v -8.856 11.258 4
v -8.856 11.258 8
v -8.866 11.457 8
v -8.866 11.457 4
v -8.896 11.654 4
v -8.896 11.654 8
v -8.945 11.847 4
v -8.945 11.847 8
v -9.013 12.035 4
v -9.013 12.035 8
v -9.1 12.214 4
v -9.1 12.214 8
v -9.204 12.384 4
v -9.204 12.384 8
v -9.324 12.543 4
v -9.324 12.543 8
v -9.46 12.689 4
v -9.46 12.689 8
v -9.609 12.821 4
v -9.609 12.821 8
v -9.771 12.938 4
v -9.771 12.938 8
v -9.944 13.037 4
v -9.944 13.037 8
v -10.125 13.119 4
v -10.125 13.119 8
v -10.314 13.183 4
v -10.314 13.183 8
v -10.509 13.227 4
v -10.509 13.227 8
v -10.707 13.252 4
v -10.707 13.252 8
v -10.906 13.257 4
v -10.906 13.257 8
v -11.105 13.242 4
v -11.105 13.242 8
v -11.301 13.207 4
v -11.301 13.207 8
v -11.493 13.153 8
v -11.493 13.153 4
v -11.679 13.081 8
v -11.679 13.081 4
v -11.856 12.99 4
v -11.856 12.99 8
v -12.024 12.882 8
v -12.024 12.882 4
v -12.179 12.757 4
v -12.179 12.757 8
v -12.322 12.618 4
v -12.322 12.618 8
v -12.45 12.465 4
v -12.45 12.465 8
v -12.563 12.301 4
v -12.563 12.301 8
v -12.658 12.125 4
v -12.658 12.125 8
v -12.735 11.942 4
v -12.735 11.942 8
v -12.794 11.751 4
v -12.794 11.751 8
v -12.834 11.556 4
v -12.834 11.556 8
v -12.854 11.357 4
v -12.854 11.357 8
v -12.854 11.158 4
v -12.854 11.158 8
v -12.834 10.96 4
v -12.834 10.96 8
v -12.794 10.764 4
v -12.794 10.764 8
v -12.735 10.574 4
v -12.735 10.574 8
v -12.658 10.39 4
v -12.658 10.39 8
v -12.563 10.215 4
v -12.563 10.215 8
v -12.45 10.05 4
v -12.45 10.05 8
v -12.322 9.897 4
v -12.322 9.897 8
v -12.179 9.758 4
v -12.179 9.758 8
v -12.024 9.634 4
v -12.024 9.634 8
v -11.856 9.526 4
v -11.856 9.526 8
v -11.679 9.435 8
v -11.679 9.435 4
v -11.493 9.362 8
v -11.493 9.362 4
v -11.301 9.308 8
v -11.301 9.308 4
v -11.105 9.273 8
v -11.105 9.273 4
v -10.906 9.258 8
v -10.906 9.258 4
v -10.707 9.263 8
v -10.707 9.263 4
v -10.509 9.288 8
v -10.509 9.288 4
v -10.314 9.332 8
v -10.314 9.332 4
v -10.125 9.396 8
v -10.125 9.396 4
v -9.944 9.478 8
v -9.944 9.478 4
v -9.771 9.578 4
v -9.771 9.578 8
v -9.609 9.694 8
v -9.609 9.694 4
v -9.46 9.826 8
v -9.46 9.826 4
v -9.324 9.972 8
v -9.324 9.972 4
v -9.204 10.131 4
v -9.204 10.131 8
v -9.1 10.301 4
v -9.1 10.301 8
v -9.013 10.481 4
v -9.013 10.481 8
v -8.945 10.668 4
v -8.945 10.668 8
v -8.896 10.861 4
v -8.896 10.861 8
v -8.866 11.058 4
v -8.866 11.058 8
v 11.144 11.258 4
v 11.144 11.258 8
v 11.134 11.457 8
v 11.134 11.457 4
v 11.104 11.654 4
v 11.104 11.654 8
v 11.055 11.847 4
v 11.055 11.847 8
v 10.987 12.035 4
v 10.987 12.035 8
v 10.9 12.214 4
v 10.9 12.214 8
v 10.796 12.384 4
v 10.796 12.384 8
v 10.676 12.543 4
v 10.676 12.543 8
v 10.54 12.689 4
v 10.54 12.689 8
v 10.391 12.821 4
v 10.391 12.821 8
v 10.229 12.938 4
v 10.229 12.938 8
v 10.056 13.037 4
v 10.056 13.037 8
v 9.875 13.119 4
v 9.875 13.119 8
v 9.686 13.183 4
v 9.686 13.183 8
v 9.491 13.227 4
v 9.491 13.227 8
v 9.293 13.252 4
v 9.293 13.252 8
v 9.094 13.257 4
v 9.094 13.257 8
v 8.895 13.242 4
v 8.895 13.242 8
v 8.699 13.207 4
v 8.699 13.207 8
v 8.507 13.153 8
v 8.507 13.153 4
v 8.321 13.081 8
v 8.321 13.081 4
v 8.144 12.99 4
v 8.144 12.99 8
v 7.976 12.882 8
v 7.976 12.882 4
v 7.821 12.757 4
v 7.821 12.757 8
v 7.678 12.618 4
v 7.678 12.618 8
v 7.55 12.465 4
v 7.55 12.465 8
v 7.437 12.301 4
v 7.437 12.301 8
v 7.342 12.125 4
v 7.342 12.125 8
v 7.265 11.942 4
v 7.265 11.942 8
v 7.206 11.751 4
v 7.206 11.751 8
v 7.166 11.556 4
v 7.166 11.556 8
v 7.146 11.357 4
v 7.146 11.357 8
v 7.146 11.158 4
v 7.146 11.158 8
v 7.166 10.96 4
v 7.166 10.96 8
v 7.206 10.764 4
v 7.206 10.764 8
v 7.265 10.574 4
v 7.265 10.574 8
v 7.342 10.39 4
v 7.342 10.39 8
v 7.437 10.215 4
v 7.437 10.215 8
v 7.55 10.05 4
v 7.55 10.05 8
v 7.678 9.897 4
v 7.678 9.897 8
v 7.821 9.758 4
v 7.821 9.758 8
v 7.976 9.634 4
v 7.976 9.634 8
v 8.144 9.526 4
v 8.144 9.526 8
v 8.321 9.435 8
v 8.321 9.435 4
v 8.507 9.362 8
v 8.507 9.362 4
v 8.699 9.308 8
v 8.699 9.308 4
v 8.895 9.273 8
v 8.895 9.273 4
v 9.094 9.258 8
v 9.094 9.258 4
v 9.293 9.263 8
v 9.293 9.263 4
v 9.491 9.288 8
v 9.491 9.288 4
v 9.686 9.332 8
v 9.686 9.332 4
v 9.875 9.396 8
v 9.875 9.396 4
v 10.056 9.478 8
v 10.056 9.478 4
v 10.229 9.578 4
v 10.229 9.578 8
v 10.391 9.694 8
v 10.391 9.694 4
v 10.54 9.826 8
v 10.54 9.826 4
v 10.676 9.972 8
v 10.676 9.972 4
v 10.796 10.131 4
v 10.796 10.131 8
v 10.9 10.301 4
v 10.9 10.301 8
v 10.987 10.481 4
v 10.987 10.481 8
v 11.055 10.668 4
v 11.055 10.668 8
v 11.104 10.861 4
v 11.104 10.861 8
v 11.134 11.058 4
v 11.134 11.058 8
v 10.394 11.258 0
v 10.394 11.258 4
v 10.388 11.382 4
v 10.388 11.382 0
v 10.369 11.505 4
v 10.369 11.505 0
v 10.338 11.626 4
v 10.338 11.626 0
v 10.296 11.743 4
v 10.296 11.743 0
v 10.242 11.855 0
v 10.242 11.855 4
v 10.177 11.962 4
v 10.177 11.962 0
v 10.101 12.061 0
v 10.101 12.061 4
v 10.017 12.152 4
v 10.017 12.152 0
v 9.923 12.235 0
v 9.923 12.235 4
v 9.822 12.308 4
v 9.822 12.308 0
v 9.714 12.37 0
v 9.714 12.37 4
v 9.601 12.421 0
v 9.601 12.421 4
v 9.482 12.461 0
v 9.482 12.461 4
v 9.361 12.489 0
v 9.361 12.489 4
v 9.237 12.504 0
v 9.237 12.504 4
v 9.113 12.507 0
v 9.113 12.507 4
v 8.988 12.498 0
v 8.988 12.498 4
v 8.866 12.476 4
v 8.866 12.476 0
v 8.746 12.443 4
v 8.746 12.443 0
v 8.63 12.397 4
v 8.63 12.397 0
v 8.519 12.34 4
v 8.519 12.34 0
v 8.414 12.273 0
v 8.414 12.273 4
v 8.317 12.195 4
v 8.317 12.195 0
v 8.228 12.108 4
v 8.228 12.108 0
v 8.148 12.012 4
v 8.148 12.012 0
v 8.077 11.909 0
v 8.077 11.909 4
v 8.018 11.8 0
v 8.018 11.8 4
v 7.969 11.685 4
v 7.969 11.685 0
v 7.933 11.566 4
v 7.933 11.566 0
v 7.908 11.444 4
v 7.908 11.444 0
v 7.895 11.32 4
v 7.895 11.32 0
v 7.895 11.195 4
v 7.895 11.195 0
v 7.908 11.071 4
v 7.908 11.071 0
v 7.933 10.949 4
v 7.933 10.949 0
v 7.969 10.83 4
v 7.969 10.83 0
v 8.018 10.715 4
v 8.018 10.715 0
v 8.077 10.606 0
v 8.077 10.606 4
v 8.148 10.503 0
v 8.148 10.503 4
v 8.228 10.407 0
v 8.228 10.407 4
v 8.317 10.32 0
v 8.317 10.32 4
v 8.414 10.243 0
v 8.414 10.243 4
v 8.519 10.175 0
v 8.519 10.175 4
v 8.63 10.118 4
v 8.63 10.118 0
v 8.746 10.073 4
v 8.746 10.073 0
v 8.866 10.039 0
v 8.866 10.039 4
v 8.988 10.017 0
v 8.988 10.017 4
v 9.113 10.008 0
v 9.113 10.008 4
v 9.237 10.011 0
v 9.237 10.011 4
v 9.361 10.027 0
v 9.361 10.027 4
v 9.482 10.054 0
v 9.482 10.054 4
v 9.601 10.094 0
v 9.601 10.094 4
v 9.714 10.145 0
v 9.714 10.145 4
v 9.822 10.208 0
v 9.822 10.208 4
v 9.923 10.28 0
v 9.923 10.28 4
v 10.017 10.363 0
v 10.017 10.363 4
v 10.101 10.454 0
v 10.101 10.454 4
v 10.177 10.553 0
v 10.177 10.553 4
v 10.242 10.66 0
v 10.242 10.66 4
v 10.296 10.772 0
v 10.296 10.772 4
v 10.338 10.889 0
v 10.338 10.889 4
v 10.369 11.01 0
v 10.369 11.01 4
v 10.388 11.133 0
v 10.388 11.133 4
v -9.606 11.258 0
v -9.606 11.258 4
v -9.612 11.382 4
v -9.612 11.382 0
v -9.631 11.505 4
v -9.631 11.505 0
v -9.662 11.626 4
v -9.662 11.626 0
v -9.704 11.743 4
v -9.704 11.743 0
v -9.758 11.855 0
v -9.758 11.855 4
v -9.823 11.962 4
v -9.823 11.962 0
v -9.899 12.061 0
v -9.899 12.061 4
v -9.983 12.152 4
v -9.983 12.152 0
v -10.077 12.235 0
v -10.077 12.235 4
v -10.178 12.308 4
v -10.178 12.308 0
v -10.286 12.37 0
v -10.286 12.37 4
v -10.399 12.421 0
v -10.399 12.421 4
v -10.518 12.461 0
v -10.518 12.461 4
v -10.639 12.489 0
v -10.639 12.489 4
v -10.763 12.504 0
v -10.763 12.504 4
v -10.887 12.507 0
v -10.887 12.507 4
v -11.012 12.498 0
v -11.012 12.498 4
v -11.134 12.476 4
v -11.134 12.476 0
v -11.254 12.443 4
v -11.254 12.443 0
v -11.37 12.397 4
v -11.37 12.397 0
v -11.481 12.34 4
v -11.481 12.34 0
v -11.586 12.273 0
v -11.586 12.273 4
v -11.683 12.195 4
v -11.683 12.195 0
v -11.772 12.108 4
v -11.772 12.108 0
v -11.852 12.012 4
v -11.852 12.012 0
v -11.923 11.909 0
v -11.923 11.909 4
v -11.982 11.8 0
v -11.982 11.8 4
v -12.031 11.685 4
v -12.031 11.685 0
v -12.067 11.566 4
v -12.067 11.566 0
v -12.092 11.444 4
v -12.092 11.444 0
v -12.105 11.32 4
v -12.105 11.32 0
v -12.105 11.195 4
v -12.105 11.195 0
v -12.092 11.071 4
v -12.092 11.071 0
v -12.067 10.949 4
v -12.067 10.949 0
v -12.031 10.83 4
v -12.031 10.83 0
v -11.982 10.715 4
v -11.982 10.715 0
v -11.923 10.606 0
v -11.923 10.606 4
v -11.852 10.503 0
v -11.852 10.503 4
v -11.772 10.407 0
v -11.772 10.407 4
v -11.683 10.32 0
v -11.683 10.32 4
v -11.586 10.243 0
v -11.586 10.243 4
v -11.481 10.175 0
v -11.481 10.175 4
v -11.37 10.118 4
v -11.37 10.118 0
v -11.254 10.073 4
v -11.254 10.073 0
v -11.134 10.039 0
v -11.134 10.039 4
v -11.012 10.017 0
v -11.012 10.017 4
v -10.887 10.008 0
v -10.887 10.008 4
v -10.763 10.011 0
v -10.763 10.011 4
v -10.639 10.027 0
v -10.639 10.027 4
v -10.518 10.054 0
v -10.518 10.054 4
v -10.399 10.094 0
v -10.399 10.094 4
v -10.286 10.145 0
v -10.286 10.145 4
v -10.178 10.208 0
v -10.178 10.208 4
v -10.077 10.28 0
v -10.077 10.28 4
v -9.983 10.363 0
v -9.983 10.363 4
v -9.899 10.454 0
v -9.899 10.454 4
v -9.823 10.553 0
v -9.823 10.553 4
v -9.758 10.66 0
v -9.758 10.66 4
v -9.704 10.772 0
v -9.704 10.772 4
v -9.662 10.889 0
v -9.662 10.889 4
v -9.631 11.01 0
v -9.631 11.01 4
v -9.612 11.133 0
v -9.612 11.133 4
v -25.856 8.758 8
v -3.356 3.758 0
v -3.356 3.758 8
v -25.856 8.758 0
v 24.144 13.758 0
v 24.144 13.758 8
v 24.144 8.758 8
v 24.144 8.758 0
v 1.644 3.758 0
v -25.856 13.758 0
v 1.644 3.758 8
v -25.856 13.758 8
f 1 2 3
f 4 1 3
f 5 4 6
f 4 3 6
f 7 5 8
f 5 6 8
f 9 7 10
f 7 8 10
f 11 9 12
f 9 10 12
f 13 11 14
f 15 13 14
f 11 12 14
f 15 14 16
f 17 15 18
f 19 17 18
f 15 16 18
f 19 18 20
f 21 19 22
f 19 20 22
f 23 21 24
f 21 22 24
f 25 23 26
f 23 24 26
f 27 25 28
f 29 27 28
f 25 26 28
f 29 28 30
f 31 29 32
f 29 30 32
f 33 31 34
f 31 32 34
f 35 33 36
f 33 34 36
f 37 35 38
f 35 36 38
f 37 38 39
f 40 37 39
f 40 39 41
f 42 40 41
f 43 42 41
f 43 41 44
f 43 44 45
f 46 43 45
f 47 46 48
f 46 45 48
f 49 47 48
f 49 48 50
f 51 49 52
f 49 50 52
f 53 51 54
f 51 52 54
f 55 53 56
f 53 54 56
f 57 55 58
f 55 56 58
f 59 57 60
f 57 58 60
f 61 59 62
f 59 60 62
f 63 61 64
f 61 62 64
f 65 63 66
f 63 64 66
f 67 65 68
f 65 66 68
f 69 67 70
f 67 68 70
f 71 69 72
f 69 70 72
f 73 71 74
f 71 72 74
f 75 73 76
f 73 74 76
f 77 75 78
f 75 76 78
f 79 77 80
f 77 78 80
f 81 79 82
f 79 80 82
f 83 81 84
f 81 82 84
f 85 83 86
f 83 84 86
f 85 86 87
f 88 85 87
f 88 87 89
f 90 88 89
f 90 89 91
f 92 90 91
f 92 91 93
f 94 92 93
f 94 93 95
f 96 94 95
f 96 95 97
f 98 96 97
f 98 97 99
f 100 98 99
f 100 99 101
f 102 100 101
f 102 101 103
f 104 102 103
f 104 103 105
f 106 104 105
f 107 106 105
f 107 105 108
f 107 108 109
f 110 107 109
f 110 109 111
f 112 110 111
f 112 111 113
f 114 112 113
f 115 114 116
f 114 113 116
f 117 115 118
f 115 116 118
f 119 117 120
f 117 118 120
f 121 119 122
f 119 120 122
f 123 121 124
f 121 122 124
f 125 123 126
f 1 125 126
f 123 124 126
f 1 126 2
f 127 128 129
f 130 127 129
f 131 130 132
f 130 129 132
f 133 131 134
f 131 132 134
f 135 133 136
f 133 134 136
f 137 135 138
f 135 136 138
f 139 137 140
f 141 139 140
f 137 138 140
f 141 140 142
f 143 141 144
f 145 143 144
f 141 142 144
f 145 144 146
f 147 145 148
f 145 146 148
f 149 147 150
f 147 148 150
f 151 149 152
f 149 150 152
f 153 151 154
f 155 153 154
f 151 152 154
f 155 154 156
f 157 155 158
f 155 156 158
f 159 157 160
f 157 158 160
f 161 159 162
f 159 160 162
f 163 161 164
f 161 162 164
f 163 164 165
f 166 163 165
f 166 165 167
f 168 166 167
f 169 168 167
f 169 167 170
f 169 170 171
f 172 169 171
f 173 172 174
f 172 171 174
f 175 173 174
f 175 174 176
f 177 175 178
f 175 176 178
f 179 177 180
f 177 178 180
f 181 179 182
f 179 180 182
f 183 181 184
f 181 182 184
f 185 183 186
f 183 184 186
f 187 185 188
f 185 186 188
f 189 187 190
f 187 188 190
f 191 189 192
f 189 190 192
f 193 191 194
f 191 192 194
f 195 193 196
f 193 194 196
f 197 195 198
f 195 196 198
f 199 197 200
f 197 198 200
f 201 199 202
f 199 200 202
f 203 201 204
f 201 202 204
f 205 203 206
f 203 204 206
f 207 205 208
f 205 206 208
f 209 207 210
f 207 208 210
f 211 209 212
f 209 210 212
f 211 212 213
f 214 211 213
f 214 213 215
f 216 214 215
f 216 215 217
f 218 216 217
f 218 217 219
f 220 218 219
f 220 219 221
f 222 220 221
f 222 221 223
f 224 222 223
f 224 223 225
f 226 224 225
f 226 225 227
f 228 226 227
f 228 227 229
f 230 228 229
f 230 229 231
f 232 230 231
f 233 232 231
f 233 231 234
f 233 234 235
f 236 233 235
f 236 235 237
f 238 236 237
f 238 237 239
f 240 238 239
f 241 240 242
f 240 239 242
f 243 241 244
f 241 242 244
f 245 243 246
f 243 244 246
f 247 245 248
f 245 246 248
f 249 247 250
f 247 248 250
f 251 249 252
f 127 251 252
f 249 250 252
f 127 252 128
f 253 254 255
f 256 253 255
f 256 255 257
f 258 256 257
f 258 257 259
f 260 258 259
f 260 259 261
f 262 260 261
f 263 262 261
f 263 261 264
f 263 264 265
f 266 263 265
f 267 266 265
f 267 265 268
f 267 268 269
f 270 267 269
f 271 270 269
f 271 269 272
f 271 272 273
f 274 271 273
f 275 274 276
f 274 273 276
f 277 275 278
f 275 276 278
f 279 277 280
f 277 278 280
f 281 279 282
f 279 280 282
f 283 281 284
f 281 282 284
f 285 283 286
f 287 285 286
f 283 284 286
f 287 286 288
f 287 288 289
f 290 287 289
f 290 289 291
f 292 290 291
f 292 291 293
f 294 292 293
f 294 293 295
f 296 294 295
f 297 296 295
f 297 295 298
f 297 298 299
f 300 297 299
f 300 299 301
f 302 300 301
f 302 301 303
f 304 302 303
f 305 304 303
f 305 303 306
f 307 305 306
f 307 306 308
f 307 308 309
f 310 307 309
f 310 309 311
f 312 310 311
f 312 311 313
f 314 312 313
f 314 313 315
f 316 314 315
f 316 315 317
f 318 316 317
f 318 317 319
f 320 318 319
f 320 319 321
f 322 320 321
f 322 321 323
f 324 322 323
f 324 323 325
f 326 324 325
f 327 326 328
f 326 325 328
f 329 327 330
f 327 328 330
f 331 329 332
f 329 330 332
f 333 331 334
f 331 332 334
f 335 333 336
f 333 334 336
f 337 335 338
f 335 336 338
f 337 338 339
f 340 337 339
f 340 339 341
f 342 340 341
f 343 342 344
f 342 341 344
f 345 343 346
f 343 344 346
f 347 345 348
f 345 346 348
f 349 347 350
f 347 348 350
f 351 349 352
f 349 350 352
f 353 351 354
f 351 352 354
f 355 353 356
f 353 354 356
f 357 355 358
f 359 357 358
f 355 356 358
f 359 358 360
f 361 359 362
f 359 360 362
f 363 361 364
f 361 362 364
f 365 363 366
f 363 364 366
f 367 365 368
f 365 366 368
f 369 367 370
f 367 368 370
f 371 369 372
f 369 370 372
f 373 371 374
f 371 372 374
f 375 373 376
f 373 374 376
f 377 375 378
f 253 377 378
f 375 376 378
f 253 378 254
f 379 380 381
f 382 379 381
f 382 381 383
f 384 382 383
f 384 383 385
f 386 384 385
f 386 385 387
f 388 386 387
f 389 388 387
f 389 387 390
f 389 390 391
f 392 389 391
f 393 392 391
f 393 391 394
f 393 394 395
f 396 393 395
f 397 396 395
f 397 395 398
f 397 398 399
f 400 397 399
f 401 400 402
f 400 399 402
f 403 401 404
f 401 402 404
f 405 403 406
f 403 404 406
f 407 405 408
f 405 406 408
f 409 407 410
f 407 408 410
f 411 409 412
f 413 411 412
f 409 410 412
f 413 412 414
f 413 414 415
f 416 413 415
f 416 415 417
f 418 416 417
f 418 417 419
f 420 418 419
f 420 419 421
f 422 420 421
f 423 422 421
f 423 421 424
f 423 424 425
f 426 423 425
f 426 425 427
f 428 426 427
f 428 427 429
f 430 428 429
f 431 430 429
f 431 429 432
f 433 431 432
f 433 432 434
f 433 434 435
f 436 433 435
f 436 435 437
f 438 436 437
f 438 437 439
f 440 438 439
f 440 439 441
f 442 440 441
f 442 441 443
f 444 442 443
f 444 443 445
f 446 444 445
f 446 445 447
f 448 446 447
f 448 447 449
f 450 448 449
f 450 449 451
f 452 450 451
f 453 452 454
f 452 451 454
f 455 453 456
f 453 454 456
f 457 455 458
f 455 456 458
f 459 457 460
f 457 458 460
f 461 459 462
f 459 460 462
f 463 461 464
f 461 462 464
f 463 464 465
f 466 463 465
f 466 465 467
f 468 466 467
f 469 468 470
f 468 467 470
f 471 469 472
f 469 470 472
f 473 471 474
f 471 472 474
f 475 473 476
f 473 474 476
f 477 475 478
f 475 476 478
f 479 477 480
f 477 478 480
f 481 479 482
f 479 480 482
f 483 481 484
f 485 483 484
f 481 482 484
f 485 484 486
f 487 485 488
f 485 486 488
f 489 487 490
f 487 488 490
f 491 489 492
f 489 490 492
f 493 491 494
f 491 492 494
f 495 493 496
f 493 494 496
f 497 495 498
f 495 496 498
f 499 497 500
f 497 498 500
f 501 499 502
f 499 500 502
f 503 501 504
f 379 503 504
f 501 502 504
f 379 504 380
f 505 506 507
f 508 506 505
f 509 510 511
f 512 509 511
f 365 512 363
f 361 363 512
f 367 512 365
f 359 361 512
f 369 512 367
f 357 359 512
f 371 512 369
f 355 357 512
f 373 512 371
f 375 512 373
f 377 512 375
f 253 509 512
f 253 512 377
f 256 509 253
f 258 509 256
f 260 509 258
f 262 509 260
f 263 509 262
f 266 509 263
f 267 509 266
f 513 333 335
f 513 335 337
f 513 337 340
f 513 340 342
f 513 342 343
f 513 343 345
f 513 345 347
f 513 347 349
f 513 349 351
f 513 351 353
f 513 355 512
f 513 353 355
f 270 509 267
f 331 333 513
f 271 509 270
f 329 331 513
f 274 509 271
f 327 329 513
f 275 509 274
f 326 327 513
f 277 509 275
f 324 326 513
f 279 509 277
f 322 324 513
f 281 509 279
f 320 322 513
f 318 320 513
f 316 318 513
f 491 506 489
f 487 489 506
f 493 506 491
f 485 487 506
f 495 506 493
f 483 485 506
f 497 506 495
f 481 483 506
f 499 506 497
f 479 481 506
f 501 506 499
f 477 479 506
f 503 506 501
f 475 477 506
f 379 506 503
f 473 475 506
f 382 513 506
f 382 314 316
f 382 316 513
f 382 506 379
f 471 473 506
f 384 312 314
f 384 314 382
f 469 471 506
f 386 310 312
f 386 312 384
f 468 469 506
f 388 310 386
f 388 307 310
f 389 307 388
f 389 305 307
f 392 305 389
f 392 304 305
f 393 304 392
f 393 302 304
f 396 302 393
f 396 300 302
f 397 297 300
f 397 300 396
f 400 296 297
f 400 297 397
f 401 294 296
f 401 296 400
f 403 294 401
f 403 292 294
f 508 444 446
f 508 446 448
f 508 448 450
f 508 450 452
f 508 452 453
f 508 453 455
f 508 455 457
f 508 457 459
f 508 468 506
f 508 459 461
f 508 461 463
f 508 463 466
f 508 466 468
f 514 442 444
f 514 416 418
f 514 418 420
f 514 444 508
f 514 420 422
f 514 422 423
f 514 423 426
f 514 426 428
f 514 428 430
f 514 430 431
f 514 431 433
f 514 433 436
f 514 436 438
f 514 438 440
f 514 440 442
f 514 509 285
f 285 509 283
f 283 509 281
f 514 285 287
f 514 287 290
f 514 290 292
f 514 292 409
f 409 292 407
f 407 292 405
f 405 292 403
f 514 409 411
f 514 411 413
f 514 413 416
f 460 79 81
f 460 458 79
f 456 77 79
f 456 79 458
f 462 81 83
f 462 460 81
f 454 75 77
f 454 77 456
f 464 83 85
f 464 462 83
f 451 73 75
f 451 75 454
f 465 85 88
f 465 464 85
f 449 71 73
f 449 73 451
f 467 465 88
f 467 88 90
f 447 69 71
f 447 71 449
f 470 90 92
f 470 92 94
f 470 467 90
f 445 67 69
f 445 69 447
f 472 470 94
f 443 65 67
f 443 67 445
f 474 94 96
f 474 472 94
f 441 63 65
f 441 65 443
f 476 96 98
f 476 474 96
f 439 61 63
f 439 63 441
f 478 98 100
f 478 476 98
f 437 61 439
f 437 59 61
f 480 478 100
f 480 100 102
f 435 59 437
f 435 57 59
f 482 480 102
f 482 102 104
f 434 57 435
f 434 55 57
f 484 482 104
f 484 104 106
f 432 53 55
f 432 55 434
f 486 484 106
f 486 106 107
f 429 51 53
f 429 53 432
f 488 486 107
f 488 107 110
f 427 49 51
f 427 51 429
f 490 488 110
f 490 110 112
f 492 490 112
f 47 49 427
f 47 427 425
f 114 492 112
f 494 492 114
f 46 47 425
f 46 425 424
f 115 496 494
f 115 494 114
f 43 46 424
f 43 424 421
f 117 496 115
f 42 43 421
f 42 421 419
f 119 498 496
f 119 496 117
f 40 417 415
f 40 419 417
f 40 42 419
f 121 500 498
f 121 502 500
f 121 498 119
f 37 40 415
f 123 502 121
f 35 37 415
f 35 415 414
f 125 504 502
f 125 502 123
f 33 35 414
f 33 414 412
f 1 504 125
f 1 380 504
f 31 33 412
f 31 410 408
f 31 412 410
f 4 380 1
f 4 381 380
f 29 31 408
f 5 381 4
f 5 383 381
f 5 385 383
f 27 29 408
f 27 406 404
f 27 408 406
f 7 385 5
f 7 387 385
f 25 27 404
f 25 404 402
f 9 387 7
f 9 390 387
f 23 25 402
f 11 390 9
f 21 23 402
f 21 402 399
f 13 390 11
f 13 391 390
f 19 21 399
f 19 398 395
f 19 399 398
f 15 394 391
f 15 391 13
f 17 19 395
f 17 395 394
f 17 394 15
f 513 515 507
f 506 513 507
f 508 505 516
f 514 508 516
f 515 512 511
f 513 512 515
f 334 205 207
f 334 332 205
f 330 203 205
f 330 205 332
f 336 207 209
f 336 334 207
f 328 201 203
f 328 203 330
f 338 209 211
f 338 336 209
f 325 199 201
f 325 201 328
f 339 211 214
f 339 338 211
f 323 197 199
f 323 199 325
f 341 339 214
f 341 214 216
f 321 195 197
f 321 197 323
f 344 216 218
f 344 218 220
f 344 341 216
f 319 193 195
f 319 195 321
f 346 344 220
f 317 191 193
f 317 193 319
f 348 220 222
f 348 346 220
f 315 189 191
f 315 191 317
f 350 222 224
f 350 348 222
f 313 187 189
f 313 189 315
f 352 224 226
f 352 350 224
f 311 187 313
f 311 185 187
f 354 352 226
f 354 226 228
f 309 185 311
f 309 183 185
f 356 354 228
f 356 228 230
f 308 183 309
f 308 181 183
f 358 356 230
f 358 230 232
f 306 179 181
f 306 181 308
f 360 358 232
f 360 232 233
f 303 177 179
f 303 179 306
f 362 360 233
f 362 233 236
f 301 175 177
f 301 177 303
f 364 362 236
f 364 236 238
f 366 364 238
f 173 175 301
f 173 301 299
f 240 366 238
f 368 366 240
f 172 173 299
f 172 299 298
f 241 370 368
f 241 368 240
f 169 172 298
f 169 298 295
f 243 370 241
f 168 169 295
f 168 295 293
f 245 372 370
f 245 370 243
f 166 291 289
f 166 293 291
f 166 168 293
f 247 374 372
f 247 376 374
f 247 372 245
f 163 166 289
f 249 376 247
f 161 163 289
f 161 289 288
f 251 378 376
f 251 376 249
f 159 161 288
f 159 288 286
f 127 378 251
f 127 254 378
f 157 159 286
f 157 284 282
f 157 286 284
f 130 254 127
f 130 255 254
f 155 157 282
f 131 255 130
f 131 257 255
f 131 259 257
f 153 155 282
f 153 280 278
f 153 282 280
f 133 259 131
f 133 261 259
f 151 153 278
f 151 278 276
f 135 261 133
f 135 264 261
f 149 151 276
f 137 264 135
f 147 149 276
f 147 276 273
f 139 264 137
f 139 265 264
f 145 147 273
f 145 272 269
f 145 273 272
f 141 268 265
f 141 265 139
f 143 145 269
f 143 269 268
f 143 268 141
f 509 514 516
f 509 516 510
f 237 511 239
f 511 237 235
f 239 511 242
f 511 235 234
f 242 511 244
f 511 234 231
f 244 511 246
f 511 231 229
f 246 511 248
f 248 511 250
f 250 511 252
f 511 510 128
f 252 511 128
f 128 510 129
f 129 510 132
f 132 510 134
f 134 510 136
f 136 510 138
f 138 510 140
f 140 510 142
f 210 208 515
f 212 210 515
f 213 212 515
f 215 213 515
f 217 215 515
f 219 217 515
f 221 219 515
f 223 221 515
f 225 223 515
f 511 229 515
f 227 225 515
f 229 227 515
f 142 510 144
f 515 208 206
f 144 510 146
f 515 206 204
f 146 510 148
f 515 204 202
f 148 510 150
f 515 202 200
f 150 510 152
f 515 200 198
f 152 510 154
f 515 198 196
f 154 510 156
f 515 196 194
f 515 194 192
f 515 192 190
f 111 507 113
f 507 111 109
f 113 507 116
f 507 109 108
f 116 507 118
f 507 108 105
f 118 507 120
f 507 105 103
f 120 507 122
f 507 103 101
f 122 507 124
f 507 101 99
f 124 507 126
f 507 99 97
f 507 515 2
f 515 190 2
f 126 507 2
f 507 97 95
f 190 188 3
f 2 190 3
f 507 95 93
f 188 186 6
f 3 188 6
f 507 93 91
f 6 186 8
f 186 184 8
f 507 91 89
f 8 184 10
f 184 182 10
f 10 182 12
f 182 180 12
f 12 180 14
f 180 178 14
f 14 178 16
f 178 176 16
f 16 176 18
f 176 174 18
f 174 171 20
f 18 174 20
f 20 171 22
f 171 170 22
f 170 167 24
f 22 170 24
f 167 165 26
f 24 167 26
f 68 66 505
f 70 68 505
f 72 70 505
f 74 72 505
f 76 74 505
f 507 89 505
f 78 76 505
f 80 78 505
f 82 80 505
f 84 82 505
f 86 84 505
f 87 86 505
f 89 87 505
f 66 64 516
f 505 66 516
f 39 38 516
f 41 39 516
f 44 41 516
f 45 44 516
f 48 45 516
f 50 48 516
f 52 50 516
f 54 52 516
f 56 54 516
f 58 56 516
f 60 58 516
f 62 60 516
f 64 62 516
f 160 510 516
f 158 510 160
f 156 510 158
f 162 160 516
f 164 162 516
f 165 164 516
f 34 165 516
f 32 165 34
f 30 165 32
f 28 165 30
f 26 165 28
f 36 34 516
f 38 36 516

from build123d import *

# Parameters (mm, degrees)
EXTRUDE_1_DEPTH     = 8
SKETCH_2_R          = 1.25
CUT_EXTRUDE_1_DEPTH = 8
SKETCH_3_R          = 2
CUT_EXTRUDE_2_DEPTH = 4


with BuildPart() as part:
    # Эскиз1 → Бобышка-Вытянуть1 (new body)
    with BuildSketch(Plane.XY):
        Polygon((-25.856072272, 13.757630696), (24.143927728, 13.757630696), (24.143927728, 8.757630696), (1.643927728, 3.757630696), (-3.356072272, 3.757630696), (-25.856072272, 8.757630696), align=None)
    extrude(amount=EXTRUDE_1_DEPTH)

    # Эскиз2 → Вырез-Вытянуть1 (cut)
    with BuildSketch(Plane.XY.offset(8)):
        with Locations((-10.856072272, 11.257630696)):
            Circle(SKETCH_2_R)
        with Locations((9.143927728, 11.257630696)):
            Circle(SKETCH_2_R)
    extrude(amount=-CUT_EXTRUDE_1_DEPTH, mode=Mode.SUBTRACT)

    # Эскиз3 → Вырез-Вытянуть2 (cut)
    with BuildSketch(Plane.XY.offset(8)):
        with Locations((-10.856072272, 11.257630696)):
            Circle(SKETCH_3_R)
        with Locations((9.143927728, 11.257630696)):
            Circle(SKETCH_3_R)
    extrude(amount=-CUT_EXTRUDE_2_DEPTH, mode=Mode.SUBTRACT)


solid = part.part
